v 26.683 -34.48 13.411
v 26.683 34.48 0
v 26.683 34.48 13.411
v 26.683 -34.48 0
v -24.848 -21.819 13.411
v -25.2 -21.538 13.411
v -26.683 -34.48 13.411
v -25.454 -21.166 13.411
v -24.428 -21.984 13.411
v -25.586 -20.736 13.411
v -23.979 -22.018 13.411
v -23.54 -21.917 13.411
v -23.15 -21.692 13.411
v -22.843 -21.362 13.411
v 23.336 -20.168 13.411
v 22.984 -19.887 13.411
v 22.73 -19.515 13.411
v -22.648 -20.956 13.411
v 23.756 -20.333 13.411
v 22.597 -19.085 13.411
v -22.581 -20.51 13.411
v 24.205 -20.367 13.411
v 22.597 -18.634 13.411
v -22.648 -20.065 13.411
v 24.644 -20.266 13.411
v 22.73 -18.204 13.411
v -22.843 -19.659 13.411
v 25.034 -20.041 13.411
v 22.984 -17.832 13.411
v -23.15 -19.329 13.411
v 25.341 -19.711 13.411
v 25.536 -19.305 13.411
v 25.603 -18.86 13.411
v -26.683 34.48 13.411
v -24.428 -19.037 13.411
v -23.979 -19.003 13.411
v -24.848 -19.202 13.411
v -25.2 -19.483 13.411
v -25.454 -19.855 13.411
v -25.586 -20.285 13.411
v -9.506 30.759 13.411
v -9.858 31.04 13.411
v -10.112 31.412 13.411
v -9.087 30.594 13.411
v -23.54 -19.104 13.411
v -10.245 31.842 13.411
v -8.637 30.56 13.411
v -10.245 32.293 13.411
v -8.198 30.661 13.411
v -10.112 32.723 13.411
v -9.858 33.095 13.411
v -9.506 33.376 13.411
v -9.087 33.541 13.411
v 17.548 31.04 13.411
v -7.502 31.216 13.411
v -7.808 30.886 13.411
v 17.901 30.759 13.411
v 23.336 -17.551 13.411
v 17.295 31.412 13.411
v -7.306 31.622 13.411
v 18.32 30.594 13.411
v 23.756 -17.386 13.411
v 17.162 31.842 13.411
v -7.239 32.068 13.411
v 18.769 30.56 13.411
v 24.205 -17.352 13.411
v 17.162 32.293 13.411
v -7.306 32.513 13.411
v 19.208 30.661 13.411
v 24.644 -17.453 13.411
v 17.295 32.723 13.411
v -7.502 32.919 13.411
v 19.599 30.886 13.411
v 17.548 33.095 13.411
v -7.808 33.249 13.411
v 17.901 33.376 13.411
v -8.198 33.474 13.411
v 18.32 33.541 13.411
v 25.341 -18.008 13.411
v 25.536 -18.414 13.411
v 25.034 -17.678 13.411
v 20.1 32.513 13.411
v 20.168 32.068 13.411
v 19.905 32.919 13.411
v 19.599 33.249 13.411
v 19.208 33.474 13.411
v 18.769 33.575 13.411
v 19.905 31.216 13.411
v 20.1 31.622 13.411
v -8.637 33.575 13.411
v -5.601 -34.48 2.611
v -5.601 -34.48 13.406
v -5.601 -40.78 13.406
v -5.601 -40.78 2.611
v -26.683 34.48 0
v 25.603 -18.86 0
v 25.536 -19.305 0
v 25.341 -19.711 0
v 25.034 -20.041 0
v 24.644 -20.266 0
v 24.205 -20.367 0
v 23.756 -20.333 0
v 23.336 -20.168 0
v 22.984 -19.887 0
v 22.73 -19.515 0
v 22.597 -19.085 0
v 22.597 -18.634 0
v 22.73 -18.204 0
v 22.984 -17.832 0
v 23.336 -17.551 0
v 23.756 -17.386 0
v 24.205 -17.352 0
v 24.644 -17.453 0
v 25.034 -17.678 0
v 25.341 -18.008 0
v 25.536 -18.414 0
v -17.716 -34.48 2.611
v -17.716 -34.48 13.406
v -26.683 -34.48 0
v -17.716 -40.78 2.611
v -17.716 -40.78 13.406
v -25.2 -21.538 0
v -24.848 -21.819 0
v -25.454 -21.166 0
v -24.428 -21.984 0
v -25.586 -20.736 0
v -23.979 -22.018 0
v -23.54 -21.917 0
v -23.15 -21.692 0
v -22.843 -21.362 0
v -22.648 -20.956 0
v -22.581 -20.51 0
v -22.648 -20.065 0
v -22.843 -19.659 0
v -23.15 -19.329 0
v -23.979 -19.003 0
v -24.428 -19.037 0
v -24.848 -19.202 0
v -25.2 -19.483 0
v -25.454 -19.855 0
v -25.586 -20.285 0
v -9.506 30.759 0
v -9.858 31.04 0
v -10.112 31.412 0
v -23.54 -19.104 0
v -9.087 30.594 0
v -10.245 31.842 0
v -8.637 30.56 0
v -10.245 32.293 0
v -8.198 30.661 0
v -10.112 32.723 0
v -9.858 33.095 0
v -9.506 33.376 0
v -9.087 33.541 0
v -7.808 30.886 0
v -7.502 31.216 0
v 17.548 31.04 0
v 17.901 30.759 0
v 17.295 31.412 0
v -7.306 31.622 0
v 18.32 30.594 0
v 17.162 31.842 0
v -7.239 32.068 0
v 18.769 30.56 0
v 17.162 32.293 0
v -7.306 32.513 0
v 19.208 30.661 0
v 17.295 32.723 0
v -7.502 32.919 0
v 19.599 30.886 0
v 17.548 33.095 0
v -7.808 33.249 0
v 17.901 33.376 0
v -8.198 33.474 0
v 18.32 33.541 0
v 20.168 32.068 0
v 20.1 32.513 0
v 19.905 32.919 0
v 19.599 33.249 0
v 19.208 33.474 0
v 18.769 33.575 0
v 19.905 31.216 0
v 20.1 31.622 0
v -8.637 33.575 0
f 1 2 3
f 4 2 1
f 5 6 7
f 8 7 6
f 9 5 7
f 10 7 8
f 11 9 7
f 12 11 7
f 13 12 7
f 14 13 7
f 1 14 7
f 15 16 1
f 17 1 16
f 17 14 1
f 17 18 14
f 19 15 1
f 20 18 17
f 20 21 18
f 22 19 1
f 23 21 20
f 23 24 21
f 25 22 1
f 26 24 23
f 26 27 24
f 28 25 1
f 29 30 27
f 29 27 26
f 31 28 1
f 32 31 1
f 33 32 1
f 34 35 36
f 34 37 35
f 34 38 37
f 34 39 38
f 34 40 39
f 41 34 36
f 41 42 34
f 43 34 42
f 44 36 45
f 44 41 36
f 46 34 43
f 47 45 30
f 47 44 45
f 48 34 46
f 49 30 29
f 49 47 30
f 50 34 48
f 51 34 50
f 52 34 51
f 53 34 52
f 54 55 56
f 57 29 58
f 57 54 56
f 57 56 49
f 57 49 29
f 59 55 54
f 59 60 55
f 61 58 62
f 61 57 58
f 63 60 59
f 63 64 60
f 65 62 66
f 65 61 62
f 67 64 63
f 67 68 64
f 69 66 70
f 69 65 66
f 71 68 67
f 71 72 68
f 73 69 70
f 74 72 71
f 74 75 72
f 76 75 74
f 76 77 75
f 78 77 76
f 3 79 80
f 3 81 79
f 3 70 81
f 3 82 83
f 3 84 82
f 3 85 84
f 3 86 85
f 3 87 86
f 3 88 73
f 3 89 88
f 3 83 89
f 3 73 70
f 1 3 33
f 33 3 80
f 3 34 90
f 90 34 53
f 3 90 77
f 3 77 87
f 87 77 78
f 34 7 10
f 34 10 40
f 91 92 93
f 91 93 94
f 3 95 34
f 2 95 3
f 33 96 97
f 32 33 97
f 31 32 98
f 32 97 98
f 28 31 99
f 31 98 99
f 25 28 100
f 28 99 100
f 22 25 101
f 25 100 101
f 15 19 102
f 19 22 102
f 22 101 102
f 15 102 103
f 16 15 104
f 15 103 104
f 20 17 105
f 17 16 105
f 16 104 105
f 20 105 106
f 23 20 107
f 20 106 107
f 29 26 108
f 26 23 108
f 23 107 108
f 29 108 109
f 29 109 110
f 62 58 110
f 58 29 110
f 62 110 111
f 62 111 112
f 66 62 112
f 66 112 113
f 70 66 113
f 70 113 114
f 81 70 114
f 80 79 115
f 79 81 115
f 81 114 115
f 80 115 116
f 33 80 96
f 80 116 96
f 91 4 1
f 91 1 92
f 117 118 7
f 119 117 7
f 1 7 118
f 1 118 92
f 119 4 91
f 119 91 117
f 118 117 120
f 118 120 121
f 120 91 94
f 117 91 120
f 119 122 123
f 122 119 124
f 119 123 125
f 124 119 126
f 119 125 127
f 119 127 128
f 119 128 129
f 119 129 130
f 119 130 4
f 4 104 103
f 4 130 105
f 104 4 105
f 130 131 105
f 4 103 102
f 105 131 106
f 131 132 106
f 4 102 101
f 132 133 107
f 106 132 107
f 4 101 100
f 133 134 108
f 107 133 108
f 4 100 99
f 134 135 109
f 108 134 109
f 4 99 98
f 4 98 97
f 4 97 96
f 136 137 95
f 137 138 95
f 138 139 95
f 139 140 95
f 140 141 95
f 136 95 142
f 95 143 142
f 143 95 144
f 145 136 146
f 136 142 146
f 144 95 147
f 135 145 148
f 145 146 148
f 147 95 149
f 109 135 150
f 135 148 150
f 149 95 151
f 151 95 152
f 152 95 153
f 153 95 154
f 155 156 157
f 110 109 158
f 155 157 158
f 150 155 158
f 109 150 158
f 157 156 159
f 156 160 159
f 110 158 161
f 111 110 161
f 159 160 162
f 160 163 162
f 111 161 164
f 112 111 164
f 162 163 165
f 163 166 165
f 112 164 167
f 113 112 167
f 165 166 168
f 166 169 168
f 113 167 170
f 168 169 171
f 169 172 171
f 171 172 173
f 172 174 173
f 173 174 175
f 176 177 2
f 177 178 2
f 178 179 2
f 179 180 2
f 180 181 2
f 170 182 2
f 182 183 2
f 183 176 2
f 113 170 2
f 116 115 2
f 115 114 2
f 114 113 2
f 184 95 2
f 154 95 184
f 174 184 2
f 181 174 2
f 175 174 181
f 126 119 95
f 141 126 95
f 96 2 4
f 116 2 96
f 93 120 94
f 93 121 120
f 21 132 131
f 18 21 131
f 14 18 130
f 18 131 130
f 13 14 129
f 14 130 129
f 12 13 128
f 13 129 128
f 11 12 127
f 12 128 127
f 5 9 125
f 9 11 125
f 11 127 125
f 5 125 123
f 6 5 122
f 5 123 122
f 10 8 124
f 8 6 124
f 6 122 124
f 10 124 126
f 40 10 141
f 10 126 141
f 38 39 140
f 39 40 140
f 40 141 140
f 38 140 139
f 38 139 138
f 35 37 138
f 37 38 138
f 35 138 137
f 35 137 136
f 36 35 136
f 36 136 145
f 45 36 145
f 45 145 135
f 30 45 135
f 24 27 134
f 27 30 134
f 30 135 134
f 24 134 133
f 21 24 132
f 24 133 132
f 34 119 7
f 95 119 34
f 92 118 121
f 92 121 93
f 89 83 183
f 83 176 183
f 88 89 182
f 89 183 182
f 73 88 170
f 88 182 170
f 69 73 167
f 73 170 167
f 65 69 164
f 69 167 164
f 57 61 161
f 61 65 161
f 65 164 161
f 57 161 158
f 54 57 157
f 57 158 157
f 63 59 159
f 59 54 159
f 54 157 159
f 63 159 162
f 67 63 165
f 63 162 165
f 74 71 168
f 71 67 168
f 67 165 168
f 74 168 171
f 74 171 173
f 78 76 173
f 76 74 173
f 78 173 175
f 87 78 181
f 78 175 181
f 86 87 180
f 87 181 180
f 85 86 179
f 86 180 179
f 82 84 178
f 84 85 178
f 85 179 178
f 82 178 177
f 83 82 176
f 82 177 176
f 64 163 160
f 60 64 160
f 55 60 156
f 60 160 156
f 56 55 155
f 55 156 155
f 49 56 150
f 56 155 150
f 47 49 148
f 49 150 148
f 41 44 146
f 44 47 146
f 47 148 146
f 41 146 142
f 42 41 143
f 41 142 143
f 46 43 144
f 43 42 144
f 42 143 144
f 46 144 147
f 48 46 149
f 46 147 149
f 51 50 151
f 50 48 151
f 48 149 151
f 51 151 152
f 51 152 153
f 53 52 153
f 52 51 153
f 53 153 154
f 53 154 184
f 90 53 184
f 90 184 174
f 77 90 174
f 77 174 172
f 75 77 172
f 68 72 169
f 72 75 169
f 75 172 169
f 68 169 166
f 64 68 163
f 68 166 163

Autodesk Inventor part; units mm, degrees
ref_plane "YZ Plane" through (0, 0, 0) normal (1, 0, 0) x (0, 1, 0)
ref_plane "XZ Plane" through (0, 0, 0) normal (0, 1, 0) x (-1, 0, 0)
ref_plane "XY Plane" through (0, 0, 0) normal (0, 0, 1) x (1, 0, 0)
sketch "Sketch1" plane through (0, 0, 0) normal (0, 0, 1) x (1, 0, 0)
  line L0 (-26.6827, 34.4805) -> (26.6827, 34.4805)
  line L1 (26.6827, 34.4805) -> (26.6827, -34.4805)
  line L2 (26.6827, -34.4805) -> (-26.6827, -34.4805)
  line L3 (-26.6827, -34.4805) -> (-26.6827, 34.4805)
  circle A0 centre (24.0919, -18.8595) radius 1.5113
  circle A1 centre (-24.0919, -20.5105) radius 1.5113
  circle A2 centre (-8.7503, 32.0675) radius 1.5113
  circle A3 centre (18.6563, 32.0675) radius 1.5113
  point P0 (0, 0)
  dimension "d0" = 53.3654
  dimension "d1" = 68.961
  dimension "d2" = 3.0226
  dimension "d3" = 3.0226
  dimension "d4" = 15.621
  dimension "d5" = 13.97
  dimension "d6" = 2.5908
  dimension "d7" = 2.5908
  dimension "d8" = 3.0226
  dimension "d9" = 3.0226
  dimension "d11" = 17.9324
  dimension "d12" = 8.0264
  dimension "d13" = 2.413
extrude "Extrusion1" add sketch "Sketch1" along normal blind 13.4112
sketch "Sketch2" plane through (-26.6827, -34.4805, 0) normal (0, -1, 0) x (1, 0, 0)
  line L0 (0, 0) -> (53.3654, 0) projected
  line L1 (8.9662, 13.4061) -> (21.082, 13.4061)
  line L2 (21.082, 13.4061) -> (21.082, 2.6111)
  line L3 (21.082, 2.6111) -> (8.9662, 2.6111)
  line L4 (8.9662, 2.6111) -> (8.9662, 13.4061)
  line L5 (8.9662, 13.4061) -> (21.082, 2.6111) construction
  line L6 (21.082, 13.4061) -> (8.9662, 2.6111) construction
  line L7 (0, 0) -> (0, 13.4112) projected
  point P0 (26.6827, 0)
  point P1 (15.0241, 8.0086)
  dimension "d16" = 12.1158
  dimension "d17" = 10.795
  dimension "d18" = 8.9662
extrude "Extrusion2" add sketch "Sketch2" along normal blind 6.2992
properties part number "arduino uno"
